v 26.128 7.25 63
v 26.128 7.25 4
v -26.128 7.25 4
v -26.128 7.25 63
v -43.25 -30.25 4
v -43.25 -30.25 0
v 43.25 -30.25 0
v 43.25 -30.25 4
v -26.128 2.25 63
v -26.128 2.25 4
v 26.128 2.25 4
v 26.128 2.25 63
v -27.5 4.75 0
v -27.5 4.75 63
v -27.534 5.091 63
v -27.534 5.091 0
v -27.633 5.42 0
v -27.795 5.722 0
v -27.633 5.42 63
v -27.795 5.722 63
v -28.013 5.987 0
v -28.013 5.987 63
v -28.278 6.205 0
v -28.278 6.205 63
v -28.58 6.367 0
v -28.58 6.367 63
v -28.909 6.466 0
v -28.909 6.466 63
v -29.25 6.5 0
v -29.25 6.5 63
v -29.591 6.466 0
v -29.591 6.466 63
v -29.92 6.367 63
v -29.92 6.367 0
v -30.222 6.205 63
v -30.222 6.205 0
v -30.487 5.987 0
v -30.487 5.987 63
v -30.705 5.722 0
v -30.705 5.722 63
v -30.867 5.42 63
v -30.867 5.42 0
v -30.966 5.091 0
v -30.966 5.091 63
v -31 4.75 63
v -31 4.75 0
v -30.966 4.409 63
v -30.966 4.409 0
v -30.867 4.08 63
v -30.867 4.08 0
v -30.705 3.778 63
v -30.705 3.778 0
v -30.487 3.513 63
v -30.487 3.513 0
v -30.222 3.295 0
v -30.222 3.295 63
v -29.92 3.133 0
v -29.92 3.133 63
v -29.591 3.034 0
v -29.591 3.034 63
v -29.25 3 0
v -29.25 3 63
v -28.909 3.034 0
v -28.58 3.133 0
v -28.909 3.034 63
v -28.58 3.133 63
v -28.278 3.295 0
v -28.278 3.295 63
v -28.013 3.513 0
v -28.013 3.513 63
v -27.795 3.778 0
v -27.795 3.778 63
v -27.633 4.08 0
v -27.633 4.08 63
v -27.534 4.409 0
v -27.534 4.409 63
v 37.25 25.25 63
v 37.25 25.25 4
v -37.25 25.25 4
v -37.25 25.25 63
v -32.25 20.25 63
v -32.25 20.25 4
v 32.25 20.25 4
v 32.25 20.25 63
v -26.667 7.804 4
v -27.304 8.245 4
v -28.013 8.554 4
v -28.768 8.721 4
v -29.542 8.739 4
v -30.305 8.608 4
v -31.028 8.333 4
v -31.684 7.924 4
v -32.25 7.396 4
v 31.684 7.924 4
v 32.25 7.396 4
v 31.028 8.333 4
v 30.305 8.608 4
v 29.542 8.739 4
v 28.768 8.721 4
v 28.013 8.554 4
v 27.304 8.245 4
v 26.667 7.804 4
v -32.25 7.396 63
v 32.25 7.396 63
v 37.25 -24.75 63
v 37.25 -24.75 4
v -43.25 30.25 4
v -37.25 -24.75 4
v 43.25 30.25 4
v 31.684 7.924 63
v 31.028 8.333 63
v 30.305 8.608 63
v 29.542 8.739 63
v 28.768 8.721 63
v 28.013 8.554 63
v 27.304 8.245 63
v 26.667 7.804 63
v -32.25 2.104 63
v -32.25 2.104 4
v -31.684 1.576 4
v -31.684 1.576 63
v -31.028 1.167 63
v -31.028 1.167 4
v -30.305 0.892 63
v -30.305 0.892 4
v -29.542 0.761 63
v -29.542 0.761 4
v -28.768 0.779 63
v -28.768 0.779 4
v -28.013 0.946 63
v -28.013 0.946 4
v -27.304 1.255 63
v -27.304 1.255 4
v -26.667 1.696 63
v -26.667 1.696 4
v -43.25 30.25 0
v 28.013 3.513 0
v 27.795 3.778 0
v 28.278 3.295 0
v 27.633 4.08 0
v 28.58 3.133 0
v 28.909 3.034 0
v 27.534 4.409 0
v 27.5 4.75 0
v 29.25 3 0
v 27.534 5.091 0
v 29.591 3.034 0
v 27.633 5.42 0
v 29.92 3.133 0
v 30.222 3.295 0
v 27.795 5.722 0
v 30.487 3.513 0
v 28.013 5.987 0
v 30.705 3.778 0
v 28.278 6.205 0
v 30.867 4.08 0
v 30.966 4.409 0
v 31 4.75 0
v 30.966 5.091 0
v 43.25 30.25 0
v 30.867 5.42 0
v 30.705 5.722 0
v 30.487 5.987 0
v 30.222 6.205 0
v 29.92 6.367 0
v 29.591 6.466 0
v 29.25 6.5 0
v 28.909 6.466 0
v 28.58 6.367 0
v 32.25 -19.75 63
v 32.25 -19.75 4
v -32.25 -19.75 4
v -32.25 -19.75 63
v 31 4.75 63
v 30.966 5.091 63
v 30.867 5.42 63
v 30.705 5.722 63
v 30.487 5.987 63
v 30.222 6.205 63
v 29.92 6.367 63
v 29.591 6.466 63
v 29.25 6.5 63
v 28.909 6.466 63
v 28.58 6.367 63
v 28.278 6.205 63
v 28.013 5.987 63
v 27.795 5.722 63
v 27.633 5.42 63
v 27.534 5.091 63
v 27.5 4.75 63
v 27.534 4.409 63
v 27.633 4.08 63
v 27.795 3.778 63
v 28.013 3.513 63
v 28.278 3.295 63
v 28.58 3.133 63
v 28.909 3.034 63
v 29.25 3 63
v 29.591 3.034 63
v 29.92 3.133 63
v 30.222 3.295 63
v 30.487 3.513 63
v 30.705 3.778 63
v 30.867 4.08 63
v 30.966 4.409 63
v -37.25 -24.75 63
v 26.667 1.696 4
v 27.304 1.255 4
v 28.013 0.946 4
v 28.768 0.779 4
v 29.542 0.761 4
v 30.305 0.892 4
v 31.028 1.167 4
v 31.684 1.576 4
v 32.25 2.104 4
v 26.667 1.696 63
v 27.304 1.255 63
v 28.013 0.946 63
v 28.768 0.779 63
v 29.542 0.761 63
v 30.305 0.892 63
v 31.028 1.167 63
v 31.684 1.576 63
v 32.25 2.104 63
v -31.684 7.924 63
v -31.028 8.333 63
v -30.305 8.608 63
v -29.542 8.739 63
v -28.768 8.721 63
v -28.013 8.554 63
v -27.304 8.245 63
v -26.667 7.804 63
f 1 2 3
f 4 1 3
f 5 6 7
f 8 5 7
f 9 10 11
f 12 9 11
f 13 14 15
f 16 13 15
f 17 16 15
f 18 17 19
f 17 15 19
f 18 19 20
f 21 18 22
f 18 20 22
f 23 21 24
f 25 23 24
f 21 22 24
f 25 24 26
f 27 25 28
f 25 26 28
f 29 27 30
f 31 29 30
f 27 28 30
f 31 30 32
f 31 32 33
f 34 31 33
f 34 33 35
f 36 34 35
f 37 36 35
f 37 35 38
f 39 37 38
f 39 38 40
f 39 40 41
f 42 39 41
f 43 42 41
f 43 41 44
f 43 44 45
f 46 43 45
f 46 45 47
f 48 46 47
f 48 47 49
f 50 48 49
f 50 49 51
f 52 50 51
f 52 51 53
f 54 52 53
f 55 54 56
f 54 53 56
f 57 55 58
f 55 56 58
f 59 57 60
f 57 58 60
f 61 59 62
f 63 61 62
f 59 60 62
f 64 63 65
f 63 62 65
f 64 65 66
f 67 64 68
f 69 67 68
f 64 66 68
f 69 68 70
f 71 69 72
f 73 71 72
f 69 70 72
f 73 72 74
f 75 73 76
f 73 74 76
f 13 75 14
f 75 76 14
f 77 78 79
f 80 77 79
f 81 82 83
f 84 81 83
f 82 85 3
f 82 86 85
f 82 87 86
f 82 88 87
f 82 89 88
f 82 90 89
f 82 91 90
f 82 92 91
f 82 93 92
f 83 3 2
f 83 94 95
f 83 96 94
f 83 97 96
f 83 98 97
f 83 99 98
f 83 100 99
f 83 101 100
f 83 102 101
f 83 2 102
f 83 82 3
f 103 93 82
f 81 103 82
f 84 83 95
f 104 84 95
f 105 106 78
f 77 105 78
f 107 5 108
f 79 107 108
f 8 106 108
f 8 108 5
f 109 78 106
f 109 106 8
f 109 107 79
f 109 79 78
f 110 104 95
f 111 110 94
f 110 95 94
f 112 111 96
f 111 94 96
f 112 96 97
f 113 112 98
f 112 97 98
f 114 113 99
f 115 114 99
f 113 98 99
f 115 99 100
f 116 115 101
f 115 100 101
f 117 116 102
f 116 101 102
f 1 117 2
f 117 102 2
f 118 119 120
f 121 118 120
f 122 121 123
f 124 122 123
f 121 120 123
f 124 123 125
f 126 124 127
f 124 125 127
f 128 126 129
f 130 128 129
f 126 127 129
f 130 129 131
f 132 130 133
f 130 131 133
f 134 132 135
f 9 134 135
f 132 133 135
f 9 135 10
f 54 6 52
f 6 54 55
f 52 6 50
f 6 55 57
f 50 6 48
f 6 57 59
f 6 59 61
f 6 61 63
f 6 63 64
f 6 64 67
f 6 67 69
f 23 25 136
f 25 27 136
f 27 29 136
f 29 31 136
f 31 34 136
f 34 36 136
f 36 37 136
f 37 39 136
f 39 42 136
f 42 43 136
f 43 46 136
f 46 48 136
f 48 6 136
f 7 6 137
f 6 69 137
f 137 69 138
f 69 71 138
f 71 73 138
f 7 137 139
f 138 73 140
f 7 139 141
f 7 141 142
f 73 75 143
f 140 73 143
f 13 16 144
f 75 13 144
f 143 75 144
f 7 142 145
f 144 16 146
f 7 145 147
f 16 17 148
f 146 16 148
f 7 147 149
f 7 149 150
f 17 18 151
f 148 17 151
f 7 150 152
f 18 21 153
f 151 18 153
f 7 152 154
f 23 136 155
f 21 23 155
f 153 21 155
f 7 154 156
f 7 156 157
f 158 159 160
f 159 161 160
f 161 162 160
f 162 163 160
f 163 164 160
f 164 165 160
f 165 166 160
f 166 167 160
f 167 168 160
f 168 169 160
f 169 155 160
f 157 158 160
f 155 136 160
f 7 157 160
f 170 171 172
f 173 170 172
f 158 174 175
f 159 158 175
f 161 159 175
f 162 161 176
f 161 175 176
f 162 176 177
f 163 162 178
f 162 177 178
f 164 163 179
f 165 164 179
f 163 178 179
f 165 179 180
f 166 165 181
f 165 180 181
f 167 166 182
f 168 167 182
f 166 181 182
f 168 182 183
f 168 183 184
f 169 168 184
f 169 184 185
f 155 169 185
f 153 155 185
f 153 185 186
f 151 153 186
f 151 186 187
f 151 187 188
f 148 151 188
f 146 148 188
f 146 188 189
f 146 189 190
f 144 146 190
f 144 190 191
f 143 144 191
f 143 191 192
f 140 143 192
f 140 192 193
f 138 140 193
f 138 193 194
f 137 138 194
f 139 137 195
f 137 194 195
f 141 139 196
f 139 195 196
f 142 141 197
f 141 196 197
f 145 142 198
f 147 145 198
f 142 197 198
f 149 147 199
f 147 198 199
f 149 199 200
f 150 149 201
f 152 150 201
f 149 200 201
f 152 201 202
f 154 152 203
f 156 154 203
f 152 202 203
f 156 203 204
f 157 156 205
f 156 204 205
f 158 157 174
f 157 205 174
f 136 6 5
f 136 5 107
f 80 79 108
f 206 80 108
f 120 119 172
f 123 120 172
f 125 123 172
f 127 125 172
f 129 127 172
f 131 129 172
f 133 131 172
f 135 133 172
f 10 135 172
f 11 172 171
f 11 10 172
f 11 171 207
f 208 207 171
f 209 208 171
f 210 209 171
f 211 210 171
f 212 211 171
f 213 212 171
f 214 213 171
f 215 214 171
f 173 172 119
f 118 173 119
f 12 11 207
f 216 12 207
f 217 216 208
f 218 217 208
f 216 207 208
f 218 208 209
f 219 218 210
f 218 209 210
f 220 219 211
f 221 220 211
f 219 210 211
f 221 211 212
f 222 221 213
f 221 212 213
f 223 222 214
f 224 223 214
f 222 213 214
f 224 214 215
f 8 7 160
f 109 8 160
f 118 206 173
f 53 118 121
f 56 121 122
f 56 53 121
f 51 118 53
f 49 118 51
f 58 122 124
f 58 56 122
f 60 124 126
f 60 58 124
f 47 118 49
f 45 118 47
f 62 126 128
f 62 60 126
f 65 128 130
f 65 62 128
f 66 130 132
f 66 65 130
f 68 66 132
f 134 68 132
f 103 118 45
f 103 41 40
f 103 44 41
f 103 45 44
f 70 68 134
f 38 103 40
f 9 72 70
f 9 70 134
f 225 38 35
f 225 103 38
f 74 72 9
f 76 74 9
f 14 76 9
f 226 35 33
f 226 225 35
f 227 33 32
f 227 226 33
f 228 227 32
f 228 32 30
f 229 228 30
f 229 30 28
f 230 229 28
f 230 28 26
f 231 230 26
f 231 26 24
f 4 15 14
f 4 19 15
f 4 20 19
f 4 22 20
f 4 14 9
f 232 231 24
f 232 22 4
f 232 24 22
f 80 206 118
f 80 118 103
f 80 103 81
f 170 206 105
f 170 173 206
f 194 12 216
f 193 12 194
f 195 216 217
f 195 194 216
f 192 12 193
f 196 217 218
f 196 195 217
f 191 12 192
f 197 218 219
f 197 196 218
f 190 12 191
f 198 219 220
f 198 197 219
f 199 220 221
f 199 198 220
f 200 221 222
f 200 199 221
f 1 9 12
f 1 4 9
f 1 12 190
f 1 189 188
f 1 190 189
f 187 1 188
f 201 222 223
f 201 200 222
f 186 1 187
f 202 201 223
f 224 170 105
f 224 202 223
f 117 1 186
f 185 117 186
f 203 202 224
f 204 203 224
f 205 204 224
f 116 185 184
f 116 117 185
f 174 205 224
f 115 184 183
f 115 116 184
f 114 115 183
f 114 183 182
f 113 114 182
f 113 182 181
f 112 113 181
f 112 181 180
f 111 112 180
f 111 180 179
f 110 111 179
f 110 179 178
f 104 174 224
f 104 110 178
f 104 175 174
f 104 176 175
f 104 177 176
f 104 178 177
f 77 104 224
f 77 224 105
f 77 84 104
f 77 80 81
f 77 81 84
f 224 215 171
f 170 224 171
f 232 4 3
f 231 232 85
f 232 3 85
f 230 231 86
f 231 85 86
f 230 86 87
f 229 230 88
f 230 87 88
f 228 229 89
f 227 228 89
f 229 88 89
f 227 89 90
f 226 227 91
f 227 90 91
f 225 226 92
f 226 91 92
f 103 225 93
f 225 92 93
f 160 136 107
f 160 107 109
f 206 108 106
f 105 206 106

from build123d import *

# Parameters (mm, degrees)
F0_W     = 86.5
F0_H     = 60.5
F1_DEPTH = 4
F3_DEPTH = 59
F4_R     = 1.75
F5_DEPTH = 63.001


with BuildPart() as f1:
    # F0 (on Top) → F1 (new body)
    with BuildSketch(Plane.XY):
        Rectangle(F0_W, F0_H)
    extrude(amount=F1_DEPTH)

    # F2 (on face) → F3 (join)
    with BuildSketch(Plane.XY.offset(4)):
        Polygon((37.25, -24.75), (37.25, 25.25), (-37.25, 25.25), (-37.25, 7.3957513111), (-37.25, -24.75), align=None)
        Polygon((-32.25, 2.1042486889), (-32.25, 7.3957513111), (-32.25, 20.25), (32.25, 20.25), (32.25, 7.3957513111), (32.25, 2.1042486889), (32.25, -19.75), (-32.25, -19.75), align=None, mode=Mode.SUBTRACT)
        with BuildLine():
            Line((26.1275010008, 7.25), (-26.1275010008, 7.25))
            ThreePointArc((-26.1275010008, 7.25), (-29.154803559, 8.7488670443), (-32.25, 7.3957513111))
            Line((-32.25, 7.3957513111), (-32.25, 2.1042486889))
            ThreePointArc((-32.25, 2.1042486889), (-29.154803559, 0.7511329557), (-26.1275010008, 2.25))
            Line((-26.1275010008, 2.25), (26.1275010008, 2.25))
            ThreePointArc((26.1275010008, 2.25), (29.154803559, 0.7511329557), (32.25, 2.1042486889))
            Line((32.25, 2.1042486889), (32.25, 7.3957513111))
            ThreePointArc((32.25, 7.3957513111), (29.154803559, 8.7488670443), (26.1275010008, 7.25))
        make_face()
    extrude(amount=F3_DEPTH)

    # F4 (on face) → F5 (cut, through all)
    with BuildSketch(Plane.XY.offset(63)):
        with Locations((-29.25, 4.75)):
            Circle(F4_R)
        with Locations((29.25, 4.75)):
            Circle(F4_R)
    extrude(amount=-F5_DEPTH, mode=Mode.SUBTRACT)


solid = f1.part
